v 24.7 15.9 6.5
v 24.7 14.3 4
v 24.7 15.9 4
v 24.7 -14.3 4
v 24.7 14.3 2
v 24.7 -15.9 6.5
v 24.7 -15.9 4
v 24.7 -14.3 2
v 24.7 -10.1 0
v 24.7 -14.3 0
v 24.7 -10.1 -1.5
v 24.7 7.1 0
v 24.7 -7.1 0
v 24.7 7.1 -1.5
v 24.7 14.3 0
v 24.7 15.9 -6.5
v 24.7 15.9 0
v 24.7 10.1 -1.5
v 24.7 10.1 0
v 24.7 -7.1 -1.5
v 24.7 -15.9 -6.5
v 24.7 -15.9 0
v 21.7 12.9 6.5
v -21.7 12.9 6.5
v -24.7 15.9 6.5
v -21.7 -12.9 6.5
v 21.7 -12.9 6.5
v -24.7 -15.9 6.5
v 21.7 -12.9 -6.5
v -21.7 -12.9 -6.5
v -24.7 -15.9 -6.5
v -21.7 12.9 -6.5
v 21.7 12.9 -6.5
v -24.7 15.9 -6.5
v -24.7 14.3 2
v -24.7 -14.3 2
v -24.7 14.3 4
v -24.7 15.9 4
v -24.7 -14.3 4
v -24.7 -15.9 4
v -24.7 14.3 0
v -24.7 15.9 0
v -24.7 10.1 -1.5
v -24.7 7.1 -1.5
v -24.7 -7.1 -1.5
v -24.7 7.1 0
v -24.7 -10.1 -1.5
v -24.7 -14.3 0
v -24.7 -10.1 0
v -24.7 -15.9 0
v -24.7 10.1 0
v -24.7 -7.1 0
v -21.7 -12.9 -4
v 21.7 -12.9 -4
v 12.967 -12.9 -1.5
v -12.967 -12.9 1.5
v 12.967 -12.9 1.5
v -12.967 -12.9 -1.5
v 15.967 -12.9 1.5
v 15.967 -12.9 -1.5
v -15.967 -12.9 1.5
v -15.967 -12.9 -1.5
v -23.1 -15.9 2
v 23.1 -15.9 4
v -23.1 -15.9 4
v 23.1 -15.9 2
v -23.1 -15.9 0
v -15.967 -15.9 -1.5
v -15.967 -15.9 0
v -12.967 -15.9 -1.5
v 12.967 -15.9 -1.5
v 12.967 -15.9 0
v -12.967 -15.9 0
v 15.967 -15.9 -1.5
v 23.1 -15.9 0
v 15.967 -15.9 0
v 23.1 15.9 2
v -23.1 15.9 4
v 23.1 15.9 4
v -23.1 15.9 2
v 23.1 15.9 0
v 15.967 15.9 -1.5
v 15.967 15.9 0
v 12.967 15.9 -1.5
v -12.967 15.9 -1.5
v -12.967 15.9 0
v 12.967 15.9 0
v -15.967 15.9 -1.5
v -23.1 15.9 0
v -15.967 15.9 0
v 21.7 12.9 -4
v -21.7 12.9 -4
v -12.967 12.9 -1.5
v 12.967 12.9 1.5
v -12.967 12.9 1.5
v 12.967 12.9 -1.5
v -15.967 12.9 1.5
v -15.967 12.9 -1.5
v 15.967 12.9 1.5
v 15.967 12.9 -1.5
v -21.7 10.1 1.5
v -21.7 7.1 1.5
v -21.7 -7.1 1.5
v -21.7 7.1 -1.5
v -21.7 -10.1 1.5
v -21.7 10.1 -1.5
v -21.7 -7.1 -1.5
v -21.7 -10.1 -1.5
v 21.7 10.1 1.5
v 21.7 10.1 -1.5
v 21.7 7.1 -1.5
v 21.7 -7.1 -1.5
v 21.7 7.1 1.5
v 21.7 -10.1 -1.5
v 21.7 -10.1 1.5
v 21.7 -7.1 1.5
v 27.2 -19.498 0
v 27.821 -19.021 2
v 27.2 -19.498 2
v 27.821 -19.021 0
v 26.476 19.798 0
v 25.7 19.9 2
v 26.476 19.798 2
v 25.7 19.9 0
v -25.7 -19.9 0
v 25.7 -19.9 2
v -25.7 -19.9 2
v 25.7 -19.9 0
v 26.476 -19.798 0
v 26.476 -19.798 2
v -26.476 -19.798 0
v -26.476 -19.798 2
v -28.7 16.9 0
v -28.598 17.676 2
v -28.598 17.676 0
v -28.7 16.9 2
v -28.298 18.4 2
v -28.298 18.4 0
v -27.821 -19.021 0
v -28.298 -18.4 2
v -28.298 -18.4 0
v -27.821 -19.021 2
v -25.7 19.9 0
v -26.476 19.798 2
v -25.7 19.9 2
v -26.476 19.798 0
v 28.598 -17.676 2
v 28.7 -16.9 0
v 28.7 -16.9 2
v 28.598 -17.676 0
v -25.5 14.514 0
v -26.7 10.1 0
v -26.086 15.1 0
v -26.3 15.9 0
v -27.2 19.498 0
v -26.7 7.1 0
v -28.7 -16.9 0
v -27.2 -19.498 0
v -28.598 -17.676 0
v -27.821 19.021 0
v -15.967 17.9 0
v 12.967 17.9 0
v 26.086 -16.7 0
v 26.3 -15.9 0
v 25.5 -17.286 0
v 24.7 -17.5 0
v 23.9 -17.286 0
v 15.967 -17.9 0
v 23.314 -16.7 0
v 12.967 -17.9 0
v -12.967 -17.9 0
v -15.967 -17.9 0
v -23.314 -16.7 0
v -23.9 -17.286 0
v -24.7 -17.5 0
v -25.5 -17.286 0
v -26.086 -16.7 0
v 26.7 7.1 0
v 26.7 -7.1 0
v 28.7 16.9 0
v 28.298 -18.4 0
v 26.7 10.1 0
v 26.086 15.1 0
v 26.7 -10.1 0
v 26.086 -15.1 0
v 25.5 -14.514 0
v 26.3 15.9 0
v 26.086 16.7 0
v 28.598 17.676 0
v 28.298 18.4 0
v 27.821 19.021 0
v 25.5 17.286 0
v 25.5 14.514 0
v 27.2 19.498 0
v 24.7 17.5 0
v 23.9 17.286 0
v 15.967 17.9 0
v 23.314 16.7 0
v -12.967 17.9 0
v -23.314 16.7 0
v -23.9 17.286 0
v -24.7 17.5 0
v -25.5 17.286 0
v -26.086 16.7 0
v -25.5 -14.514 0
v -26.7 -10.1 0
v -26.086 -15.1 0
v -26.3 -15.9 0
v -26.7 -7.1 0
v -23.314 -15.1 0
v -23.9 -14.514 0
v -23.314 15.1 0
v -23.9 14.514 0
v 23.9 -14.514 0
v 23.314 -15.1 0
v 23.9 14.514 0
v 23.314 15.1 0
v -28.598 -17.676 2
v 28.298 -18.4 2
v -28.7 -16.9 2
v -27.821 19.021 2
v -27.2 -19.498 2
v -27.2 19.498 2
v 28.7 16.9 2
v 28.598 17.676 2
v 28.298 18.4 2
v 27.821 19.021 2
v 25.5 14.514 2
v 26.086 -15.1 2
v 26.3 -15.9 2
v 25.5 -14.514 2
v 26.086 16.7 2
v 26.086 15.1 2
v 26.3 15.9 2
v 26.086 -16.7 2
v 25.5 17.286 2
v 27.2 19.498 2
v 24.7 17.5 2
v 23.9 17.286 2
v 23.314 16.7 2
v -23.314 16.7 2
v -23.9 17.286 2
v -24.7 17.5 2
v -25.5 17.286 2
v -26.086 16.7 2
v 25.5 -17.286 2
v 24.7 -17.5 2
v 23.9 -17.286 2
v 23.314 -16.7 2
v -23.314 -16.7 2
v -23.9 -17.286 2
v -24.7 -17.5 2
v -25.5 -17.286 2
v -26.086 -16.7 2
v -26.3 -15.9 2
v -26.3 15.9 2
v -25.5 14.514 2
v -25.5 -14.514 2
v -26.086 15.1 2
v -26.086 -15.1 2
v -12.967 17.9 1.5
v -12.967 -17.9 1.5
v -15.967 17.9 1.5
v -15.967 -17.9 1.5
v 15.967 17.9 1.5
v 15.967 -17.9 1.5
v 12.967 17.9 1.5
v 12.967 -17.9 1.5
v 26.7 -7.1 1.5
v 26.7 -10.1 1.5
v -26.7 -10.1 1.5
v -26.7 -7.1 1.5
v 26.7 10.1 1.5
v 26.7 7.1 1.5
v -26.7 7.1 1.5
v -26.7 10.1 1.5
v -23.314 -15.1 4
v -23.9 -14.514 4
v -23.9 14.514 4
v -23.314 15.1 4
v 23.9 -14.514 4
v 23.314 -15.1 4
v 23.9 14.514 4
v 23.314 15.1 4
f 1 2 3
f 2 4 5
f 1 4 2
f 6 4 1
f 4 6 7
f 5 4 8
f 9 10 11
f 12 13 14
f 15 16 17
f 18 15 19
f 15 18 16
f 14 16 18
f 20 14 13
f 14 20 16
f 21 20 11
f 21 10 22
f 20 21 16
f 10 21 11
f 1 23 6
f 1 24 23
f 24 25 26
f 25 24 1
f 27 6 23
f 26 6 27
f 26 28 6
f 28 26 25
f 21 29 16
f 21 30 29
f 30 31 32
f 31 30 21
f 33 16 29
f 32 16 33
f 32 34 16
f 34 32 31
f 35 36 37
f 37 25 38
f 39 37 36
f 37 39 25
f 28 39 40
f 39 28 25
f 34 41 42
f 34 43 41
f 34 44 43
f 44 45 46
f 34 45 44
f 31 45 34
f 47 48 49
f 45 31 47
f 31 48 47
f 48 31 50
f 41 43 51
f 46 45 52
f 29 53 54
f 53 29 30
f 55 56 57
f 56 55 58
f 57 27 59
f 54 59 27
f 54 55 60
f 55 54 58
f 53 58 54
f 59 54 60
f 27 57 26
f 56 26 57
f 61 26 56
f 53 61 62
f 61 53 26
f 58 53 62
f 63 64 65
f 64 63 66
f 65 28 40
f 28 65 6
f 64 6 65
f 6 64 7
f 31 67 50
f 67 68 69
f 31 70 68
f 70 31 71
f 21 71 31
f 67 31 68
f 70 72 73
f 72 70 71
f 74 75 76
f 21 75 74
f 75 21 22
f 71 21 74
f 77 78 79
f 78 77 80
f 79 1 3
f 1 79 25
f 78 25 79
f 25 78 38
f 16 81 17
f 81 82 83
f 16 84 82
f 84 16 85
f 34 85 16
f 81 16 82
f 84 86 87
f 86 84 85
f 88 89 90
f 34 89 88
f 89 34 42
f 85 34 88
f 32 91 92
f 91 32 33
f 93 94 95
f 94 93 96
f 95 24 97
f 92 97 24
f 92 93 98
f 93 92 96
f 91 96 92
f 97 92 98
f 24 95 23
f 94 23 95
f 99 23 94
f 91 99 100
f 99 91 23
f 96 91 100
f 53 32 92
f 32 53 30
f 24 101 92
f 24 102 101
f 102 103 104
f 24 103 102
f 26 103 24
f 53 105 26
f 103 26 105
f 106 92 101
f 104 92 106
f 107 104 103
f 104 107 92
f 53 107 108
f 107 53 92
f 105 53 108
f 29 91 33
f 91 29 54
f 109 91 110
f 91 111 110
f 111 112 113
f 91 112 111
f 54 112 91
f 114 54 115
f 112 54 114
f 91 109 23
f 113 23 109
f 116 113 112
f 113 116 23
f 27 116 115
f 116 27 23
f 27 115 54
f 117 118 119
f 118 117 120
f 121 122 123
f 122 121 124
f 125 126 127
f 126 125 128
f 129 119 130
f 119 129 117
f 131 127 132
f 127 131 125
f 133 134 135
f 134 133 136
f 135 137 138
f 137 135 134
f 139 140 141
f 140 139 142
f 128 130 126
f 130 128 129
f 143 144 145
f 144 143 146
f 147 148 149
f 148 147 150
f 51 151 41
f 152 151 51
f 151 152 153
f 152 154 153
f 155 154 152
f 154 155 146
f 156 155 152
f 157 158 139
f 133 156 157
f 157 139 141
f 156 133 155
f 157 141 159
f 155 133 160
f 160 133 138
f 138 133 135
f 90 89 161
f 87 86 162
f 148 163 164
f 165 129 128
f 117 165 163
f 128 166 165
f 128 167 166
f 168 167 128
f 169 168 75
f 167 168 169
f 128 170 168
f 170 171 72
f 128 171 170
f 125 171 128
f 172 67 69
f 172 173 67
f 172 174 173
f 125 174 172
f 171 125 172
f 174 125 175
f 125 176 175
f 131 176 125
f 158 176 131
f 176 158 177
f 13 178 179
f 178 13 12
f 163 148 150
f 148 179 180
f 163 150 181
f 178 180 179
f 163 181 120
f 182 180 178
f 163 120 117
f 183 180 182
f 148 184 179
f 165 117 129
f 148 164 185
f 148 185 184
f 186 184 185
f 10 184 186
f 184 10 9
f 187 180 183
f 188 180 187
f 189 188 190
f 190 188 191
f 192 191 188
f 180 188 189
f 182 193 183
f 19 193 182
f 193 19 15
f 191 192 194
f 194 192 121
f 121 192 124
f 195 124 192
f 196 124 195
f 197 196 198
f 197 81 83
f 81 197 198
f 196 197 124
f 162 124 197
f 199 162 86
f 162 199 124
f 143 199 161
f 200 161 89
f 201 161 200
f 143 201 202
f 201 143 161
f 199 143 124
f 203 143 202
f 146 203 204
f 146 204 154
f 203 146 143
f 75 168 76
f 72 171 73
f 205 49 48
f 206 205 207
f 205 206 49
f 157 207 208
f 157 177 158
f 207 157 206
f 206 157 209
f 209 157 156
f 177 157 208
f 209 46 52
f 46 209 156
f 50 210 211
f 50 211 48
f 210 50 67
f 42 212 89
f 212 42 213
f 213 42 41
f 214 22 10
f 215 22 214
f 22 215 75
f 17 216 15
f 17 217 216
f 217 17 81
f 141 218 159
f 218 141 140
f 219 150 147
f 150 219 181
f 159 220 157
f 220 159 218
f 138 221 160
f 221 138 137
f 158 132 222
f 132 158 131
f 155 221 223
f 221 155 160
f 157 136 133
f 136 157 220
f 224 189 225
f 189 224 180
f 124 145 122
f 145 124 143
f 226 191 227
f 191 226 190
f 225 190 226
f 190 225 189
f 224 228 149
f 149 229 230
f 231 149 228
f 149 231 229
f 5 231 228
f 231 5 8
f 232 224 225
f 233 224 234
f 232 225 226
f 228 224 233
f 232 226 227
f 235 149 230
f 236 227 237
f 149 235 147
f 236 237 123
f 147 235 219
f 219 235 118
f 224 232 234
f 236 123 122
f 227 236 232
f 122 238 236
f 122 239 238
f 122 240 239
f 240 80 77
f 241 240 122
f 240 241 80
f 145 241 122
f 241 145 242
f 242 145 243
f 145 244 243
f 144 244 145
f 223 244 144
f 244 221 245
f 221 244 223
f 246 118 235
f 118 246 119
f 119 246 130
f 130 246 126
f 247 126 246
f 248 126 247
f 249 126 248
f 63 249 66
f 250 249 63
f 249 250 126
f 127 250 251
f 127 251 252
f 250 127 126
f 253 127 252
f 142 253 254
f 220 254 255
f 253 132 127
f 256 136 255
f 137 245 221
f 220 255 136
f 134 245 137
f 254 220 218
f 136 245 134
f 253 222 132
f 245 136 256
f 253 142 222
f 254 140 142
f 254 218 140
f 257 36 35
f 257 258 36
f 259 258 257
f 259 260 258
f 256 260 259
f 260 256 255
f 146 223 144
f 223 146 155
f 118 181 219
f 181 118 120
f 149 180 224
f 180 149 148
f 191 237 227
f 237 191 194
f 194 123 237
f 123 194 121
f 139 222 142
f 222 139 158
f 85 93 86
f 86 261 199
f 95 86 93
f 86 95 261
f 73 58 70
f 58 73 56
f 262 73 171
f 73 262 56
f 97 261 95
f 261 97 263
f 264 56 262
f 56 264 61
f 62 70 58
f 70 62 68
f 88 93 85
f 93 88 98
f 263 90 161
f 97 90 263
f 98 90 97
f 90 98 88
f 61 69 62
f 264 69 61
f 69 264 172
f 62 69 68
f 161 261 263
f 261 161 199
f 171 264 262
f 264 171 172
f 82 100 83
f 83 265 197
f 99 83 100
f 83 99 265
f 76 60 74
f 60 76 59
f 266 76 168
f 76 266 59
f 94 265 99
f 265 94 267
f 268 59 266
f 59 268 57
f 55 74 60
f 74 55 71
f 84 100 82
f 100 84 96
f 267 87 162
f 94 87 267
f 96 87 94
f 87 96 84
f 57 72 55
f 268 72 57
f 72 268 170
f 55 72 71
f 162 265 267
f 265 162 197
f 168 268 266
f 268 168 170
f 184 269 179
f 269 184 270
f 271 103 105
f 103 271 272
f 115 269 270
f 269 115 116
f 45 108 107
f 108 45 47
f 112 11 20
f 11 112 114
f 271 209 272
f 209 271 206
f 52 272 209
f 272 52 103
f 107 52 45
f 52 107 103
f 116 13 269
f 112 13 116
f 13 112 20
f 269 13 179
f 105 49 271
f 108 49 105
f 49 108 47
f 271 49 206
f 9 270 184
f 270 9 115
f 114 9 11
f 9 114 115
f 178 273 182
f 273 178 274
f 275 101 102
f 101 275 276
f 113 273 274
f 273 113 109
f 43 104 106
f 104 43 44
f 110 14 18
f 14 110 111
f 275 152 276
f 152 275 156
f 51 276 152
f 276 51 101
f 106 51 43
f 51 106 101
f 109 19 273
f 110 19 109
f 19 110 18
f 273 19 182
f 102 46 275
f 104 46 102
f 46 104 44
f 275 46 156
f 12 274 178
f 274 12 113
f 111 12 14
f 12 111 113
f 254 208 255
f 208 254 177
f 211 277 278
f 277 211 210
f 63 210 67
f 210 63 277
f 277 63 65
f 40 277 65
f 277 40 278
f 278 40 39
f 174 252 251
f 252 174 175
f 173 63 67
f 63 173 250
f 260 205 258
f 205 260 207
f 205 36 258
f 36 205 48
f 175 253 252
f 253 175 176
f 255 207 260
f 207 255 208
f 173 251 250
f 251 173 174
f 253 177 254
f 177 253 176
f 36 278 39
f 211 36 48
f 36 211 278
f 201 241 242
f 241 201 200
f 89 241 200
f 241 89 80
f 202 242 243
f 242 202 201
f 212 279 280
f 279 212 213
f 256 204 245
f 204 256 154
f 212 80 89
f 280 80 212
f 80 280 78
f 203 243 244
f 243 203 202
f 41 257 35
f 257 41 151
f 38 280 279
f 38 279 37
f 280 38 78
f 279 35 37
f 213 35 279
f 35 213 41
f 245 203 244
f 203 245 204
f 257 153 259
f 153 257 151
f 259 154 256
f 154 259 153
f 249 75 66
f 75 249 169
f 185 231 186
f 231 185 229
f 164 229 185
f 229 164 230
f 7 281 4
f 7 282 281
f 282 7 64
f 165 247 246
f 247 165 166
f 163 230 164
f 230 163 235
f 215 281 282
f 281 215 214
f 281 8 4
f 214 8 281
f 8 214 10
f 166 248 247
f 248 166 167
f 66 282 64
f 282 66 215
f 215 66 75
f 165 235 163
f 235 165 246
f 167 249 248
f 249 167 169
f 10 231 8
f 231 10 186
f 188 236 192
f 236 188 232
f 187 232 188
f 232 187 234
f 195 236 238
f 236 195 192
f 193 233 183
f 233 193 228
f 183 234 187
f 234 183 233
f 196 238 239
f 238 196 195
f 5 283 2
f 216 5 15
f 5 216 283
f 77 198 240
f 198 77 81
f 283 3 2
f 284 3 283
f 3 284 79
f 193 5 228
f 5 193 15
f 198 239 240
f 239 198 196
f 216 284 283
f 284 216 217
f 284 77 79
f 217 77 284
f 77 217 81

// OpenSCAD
// TPU Mounts — LR900-P, RP3 V2, CV50 — JeNo 7" Sentinel RTK
// ============================================================
// Three separate TPU mounting brackets for the 915 MHz telemetry
// radio, ELRS receiver, and rangefinder sensor.
//
// Select one: LR900, RP3, or CV50
//
// All mount with M3 screws + nuts (or zip ties) to the JeNo
// frame, arm, or top plate.
// ============================================================

// ============================================================
// MAKE SELECTION HERE — enable only ONE
// ============================================================
PART = "LR900";   // "LR900", "RP3", "CV50", "ALL"

// ============================================================
// COMMON
// ============================================================
tpu_t = 2.0;      // wall thickness
gap   = 0.5;      // clearance gap around the device
m3_d  = 3.2;      // M3 clearance
stl_fn = 24;      // facet count

// ============================================================
// LR900-P — 915 MHz LoRa Telemetry Module
// ============================================================
// Dimensions (vendor): 43.4 × 25.8 × 11 mm
// Mount: SMA whip on one end, UART header on one side
// Place on arm or inside body, ≥200mm from RP3 antennas

module lr900_mount() {
    lx = 43.4;  // length
    ly = 25.8;  // width
    lz = 11.0;  // height

    // Base plate with the module sitting in a cradle
    // Zip-tie slots at each end for the SMA end and loose wire end

    difference() {
        // Base + wall cradle
        union() {
            // Base plate
            linear_extrude(tpu_t)
                offset(r = 3)
                    square([lx + 8, ly + 8], center = true);

            // Side walls (cradle)
            for (y = [-1, 1])
                translate([0, y * (ly/2 + 1.5), 0])
                    cube([lx + 6, tpu_t + 1, lz + 2], center = true);

            // End walls
            for (x = [-1, 1])
                translate([x * (lx/2 + 1.5), 0, 0])
                    cube([tpu_t + 1, ly + 6, lz + 2], center = true);

            // Bottom pad (under the module)
            cube([lx - 2, ly - 2, tpu_t], center = true);
        }

        // Module cavity
        translate([0, 0, tpu_t])
            cube([lx, ly, lz + 1], center = true);

        // Zip-tie slots (lengthwise)
        for (x = [-1, 1])
            translate([x * lx/3, 0, 0])
                cube([3, ly + 10, tpu_t + 1], center = true);

        // Zip-tie slots (crosswise)
        for (y = [-1, 1])
            translate([0, y * ly/3, 0])
                cube([lx + 10, 3, tpu_t + 1], center = true);

        // M3 mount holes in the base
        for (x = [-1, 1], y = [-1, 1])
            translate([x * (lx/2 + 3), y * (ly/2 + 3), 0])
                cylinder(d = m3_d, h = tpu_t + 2, $fn = 12);
    }
}

// ============================================================
// RP3 V2 — ELRS Receiver
// ============================================================
// Dimensions: 22 × 13 × 4 mm
// Dual 65mm 2.4GHz antennas (IPEX/uFL)
// Mount: 4 pads for soldered wires, or zip-tie
// Needs antennas clear of carbon, not toward Q39

module rp3_mount() {
    rx = 22;  // length
    ry = 13;  // width
    rz = 4;   // height

    difference() {
        union() {
            // Thin base plate
            linear_extrude(tpu_t)
                offset(r = 3)
                    square([rx + 6, ry + 6], center = true);

            // Side rails
            for (y = [-1, 1])
                translate([0, y * (ry/2 + 1), 0])
                    cube([rx + 4, tpu_t, rz + 2], center = true);

            // End rail (antenna side)
            translate([rx/2 + 1, 0, 0])
                cube([tpu_t, ry + 5, rz + 2], center = true);
        }

        // Module cavity (open at the back for wire routing)
        translate([-1, 0, tpu_t])
            cube([rx, ry, rz + 1], center = true);

        // Zip-tie slot
        cube([rx + 8, 2.5, tpu_t + 1], center = true);

        // Antenna exit notch
        translate([rx/2 + 2, 0, tpu_t])
            cube([4, 4, rz + 2], center = true);

        // M3 mount holes
        for (x = [-1, 1], y = [-1, 1])
            translate([x * (rx/2 + 2), y * (ry/2 + 2), 0])
                cylinder(d = m3_d, h = tpu_t + 2, $fn = 12);
    }
}

// ============================================================
// CV50 — 50m dToF Rangefinder
// ============================================================
// Mounts under the bottom plate (or arm area) with clear nadir view
// 28.5 × 13.6 × 21.4 mm (enclosure)
// Lens points down (-Z), UART ribbon goes to FC
//

module cv50_mount() {
    cx = 28.5;  // length
    cy = 13.6;  // width (narrow direction)
    cz = 21.4;  // height (lens-down direction)

    difference() {
        union() {
            // Top plate (mounts to frame)
            linear_extrude(tpu_t)
                offset(r = 3)
                    square([cx + 10, cy + 10], center = true);

            // Corner standoffs (bottom bezel)
            for (x = [-1, 1], y = [-1, 1])
                translate([x * cx/3, y * cy/3, -cz/2])
                    cylinder(d = 4, h = cz/2 + tpu_t, $fn = 8);
        }

        // Sensor cavity (lens-down)
        translate([0, 0, -cz/2])
            cube([cx + 1, cy + 1, cz + 1], center = true);

        // Lens view port (clear aperture)
        translate([0, 0, -cz - 0.5])
            cylinder(d = 10, h = cz + 2, $fn = 24);

        // Ribbon cable exit slot
        translate([cx/2 + 1, 0, -cz/4])
            cube([6, 8, cz/2], center = true);

        // M3 mount holes (top plate → frame bottom)
        for (x = [-1, 1], y = [-1, 1])
            translate([x * (cx/2 + 3), y * (cy/2 + 3), 0])
                cylinder(d = m3_d, h = tpu_t + 2, $fn = 12);
    }
}

// ============================================================
// RENDER
// ============================================================
$fn = stl_fn;

if (PART == "LR900") {
    translate([0, 0, 0]) lr900_mount();
} else if (PART == "RP3") {
    translate([0, 0, 0]) rp3_mount();
} else if (PART == "CV50") {
    translate([0, 0, 0]) cv50_mount();
} else if (PART == "ALL") {
    $fn = 16;
    translate([-30, 0, 0]) lr900_mount();
    translate([30, 0, 0]) rp3_mount();
    translate([0, -30, 0]) cv50_mount();
}
